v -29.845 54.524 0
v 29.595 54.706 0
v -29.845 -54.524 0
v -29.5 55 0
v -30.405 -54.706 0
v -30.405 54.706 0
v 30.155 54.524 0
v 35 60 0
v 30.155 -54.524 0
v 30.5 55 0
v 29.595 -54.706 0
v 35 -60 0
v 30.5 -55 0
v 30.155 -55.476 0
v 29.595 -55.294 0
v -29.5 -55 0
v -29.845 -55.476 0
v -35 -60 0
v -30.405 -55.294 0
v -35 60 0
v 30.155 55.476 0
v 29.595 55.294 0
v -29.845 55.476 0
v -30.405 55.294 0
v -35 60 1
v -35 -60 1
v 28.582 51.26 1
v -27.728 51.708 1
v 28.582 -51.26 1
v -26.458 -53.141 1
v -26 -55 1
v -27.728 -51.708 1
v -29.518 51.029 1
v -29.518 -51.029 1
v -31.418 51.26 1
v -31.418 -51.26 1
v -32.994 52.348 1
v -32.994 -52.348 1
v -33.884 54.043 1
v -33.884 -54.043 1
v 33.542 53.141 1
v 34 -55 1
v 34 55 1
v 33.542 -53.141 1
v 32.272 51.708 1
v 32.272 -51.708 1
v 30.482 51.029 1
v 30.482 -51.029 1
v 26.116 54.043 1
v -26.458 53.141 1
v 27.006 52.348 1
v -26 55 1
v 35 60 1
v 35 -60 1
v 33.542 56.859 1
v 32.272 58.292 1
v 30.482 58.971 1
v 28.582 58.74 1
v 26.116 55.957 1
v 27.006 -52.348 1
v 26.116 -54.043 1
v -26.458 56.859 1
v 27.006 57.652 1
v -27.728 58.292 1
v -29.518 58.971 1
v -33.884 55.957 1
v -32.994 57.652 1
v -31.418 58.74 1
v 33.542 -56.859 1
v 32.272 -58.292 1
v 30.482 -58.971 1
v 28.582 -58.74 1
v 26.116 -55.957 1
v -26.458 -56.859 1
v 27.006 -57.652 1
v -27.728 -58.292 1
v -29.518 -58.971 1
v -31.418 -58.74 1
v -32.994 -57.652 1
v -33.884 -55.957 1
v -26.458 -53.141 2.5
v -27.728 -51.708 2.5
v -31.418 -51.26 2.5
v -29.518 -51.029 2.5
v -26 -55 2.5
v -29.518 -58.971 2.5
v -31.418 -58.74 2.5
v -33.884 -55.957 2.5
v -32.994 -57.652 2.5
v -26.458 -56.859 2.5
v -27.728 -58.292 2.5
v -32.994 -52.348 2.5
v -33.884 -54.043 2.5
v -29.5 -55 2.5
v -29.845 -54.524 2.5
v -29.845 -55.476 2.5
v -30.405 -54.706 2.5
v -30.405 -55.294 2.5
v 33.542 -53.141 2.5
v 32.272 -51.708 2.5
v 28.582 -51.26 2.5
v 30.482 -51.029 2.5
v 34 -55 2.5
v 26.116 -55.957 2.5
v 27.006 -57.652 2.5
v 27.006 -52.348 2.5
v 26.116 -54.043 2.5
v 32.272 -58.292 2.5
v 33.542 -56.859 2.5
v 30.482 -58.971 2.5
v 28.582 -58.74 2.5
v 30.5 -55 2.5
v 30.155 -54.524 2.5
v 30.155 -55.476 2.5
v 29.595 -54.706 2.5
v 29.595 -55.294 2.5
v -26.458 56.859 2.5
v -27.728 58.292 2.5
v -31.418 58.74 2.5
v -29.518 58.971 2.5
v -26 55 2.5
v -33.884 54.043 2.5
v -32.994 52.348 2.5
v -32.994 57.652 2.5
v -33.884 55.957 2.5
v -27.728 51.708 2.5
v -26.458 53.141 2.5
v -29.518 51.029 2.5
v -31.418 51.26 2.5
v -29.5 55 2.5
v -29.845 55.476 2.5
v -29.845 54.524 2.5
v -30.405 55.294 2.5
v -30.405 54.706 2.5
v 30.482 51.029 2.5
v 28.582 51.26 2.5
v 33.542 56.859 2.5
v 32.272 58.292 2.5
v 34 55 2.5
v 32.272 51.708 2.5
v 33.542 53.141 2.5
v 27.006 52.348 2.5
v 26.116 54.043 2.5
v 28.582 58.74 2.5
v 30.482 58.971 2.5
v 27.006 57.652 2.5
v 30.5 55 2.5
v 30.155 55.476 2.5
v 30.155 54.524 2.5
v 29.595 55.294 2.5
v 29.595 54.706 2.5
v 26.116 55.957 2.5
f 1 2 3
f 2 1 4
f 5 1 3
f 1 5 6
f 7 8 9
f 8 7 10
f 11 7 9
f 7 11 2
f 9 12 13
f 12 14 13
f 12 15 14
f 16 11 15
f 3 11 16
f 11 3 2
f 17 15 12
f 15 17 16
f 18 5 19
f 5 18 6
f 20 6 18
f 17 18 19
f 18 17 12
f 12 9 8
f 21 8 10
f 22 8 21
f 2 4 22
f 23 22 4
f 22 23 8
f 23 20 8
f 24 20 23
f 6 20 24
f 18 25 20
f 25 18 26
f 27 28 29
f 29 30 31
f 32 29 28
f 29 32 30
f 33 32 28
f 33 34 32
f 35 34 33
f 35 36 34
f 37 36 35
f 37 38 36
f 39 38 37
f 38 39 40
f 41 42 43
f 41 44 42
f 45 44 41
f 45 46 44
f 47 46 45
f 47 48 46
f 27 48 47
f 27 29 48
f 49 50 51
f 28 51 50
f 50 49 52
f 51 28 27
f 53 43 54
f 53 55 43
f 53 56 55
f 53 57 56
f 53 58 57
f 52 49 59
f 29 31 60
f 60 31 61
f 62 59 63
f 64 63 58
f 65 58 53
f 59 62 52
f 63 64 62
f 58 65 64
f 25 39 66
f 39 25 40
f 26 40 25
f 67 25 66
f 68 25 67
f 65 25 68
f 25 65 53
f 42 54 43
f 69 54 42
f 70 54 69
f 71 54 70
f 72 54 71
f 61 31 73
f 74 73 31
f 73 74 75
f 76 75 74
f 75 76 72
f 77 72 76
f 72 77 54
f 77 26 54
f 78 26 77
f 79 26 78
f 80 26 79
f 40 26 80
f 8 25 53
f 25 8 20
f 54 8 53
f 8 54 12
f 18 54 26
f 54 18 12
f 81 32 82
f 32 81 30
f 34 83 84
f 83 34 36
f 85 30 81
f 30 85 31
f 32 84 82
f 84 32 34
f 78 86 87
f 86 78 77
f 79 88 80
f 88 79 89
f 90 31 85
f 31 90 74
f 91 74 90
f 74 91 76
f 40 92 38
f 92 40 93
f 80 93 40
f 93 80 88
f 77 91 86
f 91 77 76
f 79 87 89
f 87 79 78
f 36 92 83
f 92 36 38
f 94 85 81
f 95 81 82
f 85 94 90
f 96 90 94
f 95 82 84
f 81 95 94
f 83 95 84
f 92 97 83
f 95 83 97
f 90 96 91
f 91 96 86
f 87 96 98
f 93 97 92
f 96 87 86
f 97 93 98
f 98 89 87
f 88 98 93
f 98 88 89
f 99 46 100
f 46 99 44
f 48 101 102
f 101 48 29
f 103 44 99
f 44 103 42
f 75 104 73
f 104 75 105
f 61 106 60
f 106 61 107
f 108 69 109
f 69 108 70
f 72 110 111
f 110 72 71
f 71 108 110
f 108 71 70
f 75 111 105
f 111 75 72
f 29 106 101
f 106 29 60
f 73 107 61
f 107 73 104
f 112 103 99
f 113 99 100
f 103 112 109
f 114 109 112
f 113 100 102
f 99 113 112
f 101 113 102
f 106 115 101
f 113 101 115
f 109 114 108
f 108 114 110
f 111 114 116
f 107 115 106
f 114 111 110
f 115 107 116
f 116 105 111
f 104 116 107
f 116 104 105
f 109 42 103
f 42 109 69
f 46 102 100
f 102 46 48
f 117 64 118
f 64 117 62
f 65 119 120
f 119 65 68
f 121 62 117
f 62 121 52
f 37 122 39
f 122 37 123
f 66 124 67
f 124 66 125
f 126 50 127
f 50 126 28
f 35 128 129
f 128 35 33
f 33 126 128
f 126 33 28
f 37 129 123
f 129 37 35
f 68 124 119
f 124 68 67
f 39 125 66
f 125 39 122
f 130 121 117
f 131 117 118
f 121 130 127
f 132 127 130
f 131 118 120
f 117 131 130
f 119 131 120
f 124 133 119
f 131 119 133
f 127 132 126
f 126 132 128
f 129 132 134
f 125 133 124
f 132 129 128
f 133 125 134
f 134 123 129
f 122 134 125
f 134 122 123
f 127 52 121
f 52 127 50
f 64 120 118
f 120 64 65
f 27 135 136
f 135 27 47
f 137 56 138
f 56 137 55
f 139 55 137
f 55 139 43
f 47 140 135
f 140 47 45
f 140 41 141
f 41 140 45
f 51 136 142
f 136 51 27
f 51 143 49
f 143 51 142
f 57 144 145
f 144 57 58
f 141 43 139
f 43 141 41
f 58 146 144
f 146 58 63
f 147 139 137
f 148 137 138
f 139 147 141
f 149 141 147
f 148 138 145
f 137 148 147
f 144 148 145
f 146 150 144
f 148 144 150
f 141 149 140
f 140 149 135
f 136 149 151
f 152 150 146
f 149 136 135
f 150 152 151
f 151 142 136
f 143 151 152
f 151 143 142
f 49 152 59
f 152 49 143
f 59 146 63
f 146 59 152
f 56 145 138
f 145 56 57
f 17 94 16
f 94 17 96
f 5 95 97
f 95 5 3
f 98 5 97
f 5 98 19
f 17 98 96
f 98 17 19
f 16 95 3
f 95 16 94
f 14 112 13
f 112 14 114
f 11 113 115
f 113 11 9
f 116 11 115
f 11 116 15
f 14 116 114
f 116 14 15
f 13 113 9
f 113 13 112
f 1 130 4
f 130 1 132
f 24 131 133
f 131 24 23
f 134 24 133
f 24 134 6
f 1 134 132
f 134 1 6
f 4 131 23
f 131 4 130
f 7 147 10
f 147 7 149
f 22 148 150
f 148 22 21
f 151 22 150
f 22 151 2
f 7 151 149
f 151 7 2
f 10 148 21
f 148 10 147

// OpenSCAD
difference () {
union() {
translate([-35,-60,0]) linear_extrude(height=1) square([70,120]);
translate([-30,-55,0]) linear_extrude(height=2.5) circle(4);
translate([30,-55,0]) linear_extrude(height=2.5) circle(4);
translate([-30,55,0]) linear_extrude(height=2.5) circle(4);
translate([30,55,0]) linear_extrude(height=2.5) circle(4);
}
union() {
translate([-30,-55,-1]) linear_extrude(height=4.5) circle(0.5);
translate([30,-55,-1]) linear_extrude(height=4.5) circle(0.5);
translate([-30,55,-1]) linear_extrude(height=4.5) circle(0.5);
translate([30,55,-1]) linear_extrude(height=4.5) circle(0.5);
}
}
 
